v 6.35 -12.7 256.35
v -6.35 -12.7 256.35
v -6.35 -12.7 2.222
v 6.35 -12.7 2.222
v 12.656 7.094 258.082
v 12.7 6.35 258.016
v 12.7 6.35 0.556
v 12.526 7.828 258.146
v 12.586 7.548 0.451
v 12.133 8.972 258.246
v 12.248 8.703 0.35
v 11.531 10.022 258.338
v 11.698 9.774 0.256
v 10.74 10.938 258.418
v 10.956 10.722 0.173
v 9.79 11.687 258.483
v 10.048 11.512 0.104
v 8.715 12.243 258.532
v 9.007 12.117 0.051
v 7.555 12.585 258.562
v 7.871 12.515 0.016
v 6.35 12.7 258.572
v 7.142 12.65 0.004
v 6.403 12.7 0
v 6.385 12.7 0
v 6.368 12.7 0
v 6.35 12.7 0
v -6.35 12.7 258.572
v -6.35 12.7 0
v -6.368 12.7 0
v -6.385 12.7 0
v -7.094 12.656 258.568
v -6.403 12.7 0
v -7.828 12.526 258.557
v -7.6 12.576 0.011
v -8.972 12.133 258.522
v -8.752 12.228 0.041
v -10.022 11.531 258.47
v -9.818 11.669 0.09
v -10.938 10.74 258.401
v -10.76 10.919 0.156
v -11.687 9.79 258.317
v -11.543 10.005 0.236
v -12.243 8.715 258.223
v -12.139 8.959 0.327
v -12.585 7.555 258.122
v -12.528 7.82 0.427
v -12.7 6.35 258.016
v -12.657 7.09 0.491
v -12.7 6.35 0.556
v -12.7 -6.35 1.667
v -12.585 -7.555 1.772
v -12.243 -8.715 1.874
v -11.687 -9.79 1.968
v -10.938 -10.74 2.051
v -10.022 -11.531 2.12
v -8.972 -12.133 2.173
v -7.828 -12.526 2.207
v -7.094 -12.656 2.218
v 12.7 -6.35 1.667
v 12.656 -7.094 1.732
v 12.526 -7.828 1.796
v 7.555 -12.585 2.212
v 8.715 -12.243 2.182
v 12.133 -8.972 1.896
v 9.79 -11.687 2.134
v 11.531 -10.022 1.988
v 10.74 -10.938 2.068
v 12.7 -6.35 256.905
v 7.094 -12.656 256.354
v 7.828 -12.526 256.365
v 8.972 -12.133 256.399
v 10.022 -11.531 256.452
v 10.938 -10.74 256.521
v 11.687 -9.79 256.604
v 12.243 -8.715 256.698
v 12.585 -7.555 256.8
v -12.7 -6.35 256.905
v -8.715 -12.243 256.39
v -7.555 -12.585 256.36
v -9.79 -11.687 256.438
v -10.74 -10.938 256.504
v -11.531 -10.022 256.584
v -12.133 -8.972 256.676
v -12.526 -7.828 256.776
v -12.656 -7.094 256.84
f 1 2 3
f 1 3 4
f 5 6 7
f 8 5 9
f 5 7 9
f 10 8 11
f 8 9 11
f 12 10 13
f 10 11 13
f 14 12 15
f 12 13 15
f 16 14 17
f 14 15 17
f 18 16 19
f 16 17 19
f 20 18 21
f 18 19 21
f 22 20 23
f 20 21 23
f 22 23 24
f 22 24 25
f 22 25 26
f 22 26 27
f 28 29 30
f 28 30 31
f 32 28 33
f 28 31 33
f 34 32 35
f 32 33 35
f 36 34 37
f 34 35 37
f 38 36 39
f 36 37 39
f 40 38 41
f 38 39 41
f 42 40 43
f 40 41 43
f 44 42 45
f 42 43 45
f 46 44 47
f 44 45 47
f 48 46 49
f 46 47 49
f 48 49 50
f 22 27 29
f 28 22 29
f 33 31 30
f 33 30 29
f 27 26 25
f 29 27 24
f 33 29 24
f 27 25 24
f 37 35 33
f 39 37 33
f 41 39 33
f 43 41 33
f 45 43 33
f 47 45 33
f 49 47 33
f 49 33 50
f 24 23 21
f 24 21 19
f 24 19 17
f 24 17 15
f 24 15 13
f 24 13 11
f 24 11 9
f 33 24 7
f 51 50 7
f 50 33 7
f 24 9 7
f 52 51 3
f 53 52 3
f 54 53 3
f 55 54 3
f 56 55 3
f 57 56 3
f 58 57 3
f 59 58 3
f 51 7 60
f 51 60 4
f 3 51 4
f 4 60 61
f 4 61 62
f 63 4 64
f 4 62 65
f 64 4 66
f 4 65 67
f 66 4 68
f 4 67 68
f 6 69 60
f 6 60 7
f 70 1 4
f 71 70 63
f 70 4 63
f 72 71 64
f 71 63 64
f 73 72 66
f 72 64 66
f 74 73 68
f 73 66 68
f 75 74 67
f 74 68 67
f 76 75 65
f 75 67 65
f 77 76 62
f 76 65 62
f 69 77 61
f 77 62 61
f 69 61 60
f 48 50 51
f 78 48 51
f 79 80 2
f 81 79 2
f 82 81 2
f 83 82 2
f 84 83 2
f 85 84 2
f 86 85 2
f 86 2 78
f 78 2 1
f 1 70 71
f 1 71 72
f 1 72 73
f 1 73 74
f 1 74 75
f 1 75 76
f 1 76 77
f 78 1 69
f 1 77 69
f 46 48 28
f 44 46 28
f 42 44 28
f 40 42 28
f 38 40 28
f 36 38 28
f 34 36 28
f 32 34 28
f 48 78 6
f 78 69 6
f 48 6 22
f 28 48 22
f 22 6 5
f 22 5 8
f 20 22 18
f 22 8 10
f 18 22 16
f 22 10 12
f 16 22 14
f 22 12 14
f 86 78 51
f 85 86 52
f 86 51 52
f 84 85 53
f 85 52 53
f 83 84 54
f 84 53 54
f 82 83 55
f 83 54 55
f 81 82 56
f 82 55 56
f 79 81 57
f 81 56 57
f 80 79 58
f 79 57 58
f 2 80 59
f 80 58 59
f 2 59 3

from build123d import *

# Parameters (mm, degrees)
F1_DEPTH = 258.572
F3_DEPTH = 12.7
F5_DEPTH = 12.7


with BuildPart() as f1:
    # F0 (on Top) → F1 (new body)
    with BuildSketch(Plane.XY):
        with BuildLine():
            ThreePointArc((12.7, 6.35), (10.840128, 10.840128), (6.35, 12.7))
            Line((6.35, 12.7), (-6.35, 12.7))
            ThreePointArc((-6.35, 12.7), (-10.840128, 10.840128), (-12.7, 6.35))
            Line((-12.7, 6.35), (-12.7, -6.35))
            ThreePointArc((-12.7, -6.35), (-10.840128, -10.840128), (-6.35, -12.7))
            Line((-6.35, -12.7), (6.35, -12.7))
            ThreePointArc((6.35, -12.7), (10.840128, -10.840128), (12.7, -6.35))
            Line((12.7, -6.35), (12.7, 6.35))
        make_face()
    extrude(amount=F1_DEPTH)

    # F2 (on Right) → F3 (cut, symmetric)
    with BuildSketch(Plane.YZ):
        Polygon((-17.71266, 0), (12.69978, 0), (-17.71266, 2.660744), align=None)
    extrude(amount=F3_DEPTH, both=True, mode=Mode.SUBTRACT)

    # F4 (on Right) → F5 (cut, symmetric)
    with BuildSketch(Plane.YZ):
        Polygon((-13.926481, 256.242485), (12.7, 258.572), (-13.926481, 258.572), align=None)
    extrude(amount=F5_DEPTH, both=True, mode=Mode.SUBTRACT)


solid = f1.part
